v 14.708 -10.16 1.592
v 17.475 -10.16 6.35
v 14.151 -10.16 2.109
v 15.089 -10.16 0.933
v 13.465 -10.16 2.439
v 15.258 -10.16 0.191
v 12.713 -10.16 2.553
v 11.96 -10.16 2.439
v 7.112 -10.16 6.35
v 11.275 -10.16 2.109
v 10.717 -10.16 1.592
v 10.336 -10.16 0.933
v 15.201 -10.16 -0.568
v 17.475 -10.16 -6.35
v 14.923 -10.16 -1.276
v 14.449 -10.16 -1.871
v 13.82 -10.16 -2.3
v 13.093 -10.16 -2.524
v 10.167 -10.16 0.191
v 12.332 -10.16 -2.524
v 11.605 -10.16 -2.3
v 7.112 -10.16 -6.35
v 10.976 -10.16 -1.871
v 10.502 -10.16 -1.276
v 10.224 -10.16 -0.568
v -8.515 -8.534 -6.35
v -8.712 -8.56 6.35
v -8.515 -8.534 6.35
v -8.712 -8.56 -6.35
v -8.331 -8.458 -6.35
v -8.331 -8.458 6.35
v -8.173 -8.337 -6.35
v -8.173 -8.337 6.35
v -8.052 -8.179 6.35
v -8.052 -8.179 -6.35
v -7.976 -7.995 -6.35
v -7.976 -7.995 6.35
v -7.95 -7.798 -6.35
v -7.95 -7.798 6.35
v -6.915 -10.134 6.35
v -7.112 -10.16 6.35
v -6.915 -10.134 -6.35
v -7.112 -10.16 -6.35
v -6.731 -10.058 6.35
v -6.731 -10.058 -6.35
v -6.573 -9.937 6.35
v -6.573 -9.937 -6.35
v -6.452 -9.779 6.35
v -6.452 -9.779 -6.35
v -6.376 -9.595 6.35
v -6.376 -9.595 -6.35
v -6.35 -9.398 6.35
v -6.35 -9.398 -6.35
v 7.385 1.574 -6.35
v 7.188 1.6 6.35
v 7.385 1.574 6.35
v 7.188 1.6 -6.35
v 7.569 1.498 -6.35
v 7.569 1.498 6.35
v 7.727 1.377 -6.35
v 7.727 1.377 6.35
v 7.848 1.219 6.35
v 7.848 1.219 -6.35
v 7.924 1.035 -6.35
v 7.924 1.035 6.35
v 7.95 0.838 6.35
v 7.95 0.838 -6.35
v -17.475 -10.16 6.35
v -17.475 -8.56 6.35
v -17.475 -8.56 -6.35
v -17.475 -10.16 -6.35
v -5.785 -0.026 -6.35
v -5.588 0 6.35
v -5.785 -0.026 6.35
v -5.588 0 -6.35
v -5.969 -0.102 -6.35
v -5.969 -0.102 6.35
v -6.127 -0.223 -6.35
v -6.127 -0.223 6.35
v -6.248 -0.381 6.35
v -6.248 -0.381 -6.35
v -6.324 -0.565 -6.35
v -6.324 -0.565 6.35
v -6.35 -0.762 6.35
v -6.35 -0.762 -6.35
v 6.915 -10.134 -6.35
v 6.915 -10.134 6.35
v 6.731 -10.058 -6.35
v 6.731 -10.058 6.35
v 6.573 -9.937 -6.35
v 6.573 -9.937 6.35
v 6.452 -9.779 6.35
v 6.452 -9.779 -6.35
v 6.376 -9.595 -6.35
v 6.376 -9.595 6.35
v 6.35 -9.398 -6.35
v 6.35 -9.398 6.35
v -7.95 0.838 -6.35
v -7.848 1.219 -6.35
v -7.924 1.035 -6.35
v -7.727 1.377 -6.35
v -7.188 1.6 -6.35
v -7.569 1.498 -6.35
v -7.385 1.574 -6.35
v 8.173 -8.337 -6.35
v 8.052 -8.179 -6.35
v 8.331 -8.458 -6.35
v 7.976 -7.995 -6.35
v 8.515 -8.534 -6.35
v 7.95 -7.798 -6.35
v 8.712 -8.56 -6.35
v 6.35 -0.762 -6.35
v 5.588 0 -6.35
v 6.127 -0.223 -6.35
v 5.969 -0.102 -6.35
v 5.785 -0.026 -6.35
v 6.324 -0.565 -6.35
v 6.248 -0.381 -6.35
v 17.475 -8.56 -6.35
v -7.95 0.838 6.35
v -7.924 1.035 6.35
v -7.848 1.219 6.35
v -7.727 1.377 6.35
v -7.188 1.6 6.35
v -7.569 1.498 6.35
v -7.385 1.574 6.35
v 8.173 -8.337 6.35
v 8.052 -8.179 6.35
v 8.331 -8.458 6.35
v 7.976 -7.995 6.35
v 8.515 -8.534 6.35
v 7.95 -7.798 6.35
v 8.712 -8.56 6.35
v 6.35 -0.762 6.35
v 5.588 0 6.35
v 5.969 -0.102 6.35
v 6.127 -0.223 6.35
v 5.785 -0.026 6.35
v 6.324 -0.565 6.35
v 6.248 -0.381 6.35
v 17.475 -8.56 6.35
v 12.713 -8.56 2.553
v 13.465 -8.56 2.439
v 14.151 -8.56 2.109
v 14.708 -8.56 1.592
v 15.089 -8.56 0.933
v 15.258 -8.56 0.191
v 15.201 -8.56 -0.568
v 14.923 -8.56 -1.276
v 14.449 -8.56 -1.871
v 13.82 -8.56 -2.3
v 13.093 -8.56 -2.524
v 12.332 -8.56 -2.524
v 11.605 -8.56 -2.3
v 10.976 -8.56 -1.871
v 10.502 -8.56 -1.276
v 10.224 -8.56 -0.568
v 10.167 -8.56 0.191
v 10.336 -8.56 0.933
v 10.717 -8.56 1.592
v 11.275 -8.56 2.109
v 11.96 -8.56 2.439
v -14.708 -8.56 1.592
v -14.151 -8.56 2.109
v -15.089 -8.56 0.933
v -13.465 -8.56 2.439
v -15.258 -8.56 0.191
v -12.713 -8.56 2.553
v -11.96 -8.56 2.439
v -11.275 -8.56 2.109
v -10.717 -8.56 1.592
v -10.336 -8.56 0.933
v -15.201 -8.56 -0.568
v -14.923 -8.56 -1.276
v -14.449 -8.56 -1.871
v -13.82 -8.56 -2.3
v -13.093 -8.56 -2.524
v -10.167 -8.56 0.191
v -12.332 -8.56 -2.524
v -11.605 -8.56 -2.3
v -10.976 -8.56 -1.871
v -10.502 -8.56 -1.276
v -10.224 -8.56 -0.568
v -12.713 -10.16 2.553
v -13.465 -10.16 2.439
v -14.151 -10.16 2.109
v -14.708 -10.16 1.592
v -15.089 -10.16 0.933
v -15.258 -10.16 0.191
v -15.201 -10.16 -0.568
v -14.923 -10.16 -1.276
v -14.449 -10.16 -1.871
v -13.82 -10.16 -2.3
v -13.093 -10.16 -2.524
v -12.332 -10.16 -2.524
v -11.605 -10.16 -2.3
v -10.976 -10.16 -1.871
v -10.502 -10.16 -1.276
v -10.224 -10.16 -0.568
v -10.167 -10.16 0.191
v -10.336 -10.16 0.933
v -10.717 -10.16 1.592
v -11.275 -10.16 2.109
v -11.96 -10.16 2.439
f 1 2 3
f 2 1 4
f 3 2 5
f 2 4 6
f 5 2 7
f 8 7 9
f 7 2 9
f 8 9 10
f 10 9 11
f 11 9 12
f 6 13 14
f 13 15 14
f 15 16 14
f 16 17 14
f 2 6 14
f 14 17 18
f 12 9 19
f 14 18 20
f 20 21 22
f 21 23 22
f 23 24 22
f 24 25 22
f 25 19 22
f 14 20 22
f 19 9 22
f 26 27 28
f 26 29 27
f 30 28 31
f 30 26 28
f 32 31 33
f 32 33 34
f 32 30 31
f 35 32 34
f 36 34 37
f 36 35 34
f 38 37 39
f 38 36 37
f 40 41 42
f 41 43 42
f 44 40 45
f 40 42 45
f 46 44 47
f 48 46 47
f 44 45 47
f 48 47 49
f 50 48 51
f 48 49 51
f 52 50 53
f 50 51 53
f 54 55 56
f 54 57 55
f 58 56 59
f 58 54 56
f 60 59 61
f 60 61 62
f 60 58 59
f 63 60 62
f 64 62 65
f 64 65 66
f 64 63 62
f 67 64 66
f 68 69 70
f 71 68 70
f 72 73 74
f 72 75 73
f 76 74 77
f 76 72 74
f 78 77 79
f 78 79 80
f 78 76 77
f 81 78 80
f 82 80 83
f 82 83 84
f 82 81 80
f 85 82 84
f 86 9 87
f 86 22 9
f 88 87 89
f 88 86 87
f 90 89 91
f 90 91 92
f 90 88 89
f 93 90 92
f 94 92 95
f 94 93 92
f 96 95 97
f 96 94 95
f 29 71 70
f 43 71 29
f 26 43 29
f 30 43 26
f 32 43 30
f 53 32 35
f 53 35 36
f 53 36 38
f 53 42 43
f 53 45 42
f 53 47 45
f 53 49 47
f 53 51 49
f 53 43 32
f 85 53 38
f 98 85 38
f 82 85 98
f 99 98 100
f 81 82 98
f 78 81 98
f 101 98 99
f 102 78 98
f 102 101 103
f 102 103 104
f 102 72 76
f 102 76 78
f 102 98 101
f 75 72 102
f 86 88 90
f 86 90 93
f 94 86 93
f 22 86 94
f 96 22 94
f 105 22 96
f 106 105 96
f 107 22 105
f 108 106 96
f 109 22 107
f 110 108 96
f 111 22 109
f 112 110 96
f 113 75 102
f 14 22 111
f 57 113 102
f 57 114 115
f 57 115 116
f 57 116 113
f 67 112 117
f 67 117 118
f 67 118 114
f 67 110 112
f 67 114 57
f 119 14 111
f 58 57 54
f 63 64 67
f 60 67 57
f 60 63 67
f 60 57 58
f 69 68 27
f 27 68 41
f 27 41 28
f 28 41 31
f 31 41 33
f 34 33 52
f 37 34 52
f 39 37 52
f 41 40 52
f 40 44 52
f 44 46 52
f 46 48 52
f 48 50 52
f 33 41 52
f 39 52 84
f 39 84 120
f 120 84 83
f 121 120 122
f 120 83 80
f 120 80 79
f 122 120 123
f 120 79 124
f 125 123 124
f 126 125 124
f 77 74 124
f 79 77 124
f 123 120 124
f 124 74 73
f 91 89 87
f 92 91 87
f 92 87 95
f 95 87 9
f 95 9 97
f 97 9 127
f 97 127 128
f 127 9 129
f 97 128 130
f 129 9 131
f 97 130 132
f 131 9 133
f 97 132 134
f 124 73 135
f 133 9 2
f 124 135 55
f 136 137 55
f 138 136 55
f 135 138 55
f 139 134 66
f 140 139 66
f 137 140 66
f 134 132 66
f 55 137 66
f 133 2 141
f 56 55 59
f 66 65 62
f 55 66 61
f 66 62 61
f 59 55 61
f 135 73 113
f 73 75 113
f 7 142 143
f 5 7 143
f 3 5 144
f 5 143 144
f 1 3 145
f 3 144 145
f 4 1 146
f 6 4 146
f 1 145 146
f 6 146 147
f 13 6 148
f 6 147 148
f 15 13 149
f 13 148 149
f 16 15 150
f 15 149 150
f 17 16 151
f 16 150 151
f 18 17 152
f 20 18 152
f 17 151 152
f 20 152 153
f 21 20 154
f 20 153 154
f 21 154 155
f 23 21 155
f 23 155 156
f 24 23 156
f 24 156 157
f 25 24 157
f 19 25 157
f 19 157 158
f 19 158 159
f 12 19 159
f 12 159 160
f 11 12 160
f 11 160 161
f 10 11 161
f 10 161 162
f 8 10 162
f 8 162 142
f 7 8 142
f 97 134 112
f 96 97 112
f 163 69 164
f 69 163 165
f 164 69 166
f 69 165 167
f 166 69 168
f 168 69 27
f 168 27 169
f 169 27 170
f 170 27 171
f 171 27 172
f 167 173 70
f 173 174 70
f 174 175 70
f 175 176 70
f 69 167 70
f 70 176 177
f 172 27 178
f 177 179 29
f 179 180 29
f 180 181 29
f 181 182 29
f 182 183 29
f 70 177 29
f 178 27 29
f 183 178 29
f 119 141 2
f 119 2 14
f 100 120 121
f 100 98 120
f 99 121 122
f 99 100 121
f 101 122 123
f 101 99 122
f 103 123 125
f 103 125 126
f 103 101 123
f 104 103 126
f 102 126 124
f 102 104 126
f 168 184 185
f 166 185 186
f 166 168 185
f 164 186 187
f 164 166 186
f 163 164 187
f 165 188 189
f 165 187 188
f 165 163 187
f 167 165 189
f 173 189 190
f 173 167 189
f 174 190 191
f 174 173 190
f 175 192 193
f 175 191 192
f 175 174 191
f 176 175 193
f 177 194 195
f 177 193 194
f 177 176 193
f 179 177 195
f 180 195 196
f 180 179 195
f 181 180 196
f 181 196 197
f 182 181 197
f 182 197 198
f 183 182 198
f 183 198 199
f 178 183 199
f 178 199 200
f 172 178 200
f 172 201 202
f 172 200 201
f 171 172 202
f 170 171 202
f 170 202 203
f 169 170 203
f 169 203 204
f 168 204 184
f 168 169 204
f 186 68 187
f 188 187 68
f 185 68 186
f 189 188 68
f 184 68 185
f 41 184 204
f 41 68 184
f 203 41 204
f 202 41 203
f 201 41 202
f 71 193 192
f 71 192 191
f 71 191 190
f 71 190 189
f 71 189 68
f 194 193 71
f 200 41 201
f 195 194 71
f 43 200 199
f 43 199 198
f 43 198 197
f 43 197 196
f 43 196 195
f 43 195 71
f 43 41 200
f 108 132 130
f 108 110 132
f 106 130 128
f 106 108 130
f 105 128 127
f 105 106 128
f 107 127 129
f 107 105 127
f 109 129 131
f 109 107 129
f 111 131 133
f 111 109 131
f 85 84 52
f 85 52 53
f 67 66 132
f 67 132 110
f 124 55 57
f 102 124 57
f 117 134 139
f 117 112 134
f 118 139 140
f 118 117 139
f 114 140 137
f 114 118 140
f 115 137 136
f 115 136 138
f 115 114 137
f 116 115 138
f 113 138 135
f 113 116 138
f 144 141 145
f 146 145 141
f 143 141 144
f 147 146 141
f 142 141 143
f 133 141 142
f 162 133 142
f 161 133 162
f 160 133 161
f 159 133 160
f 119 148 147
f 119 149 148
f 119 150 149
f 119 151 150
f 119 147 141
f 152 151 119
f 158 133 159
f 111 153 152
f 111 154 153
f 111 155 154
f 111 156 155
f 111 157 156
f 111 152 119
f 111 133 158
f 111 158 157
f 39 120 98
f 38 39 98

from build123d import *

# Parameters (mm, degrees)
SKETCH1_W           = 12.7
SKETCH1_H           = 12.7
BOSS_EXTRUDE1_DEPTH = 1.6002
SKETCH2_W           = 12.7
SKETCH2_H           = 11.7602
BOSS_EXTRUDE2_DEPTH = 1.6002
SKETCH3_W           = 12.7
SKETCH3_H           = 1.6002
BOSS_EXTRUDE3_DEPTH = 9.525
SKETCH4_R           = 2.5527
CUT_EXTRUDE1_DEPTH  = 22.187985158
FILLET1_R           = 0.762


with BuildPart() as part:
    # Sketch1 → Boss-Extrude1 (new body)
    with BuildSketch(Plane(origin=(0, 0, 0), x_dir=(1, 0, 0), z_dir=(0, 1, 0))):
        Rectangle(SKETCH1_W, SKETCH1_H)
    extrude(amount=BOSS_EXTRUDE1_DEPTH)

    # Sketch2 → Boss-Extrude2 (add)
    with BuildSketch(Plane(origin=(6.35, 0, 0), x_dir=(0, 0, -1), z_dir=(1, 0, 0))):
        with Locations((0, -4.2799)):
            Rectangle(SKETCH2_W, SKETCH2_H)
    boss_extrude2 = extrude(amount=BOSS_EXTRUDE2_DEPTH)

    # Sketch3 → Boss-Extrude3 (add)
    with BuildSketch(Plane(origin=(7.9502, 0, 0), x_dir=(0, 0, -1), z_dir=(1, 0, 0))):
        with Locations((0, -9.3599)):
            Rectangle(SKETCH3_W, SKETCH3_H)
    boss_extrude3 = extrude(amount=BOSS_EXTRUDE3_DEPTH)

    # Sketch4 → Cut-Extrude1 (cut, through all)
    with BuildSketch(Plane(origin=(0, -8.5598, 0), x_dir=(1, 0, 0), z_dir=(0, 1, 0))):
        with Locations(Location((12.7127, 0, 0), (0, 0, 270))):
            Circle(SKETCH4_R)
    cut_extrude1 = extrude(amount=-CUT_EXTRUDE1_DEPTH, mode=Mode.SUBTRACT)

    # Mirror2: Boss-Extrude2, Boss-Extrude3, Cut-Extrude1 across plane
    add(boss_extrude2.mirror(Plane(origin=(0, 0, 0), x_dir=(0, 0, 1), z_dir=(1, 0, 0))))
    add(boss_extrude3.mirror(Plane(origin=(0, 0, 0), x_dir=(0, 0, 1), z_dir=(1, 0, 0))))
    add(cut_extrude1.mirror(Plane(origin=(0, 0, 0), x_dir=(0, 0, 1), z_dir=(1, 0, 0))), mode=Mode.SUBTRACT)

    # Fillet1
    fillet1_edges = [part.edges().sort_by_distance(p)[0] for p in [
        (6.35, -10.16, 0),
        (-6.35, -10.16, 0),
        (6.35, 0, 0),
        (-6.35, 0, 0),
        (-7.9502, -8.5598, 0),
        (-7.9502, 1.6002, 0),
        (7.9502, 1.6002, 0),
        (7.9502, -8.5598, 0),
    ]]
    fillet(fillet1_edges, radius=FILLET1_R)


solid = part.part
